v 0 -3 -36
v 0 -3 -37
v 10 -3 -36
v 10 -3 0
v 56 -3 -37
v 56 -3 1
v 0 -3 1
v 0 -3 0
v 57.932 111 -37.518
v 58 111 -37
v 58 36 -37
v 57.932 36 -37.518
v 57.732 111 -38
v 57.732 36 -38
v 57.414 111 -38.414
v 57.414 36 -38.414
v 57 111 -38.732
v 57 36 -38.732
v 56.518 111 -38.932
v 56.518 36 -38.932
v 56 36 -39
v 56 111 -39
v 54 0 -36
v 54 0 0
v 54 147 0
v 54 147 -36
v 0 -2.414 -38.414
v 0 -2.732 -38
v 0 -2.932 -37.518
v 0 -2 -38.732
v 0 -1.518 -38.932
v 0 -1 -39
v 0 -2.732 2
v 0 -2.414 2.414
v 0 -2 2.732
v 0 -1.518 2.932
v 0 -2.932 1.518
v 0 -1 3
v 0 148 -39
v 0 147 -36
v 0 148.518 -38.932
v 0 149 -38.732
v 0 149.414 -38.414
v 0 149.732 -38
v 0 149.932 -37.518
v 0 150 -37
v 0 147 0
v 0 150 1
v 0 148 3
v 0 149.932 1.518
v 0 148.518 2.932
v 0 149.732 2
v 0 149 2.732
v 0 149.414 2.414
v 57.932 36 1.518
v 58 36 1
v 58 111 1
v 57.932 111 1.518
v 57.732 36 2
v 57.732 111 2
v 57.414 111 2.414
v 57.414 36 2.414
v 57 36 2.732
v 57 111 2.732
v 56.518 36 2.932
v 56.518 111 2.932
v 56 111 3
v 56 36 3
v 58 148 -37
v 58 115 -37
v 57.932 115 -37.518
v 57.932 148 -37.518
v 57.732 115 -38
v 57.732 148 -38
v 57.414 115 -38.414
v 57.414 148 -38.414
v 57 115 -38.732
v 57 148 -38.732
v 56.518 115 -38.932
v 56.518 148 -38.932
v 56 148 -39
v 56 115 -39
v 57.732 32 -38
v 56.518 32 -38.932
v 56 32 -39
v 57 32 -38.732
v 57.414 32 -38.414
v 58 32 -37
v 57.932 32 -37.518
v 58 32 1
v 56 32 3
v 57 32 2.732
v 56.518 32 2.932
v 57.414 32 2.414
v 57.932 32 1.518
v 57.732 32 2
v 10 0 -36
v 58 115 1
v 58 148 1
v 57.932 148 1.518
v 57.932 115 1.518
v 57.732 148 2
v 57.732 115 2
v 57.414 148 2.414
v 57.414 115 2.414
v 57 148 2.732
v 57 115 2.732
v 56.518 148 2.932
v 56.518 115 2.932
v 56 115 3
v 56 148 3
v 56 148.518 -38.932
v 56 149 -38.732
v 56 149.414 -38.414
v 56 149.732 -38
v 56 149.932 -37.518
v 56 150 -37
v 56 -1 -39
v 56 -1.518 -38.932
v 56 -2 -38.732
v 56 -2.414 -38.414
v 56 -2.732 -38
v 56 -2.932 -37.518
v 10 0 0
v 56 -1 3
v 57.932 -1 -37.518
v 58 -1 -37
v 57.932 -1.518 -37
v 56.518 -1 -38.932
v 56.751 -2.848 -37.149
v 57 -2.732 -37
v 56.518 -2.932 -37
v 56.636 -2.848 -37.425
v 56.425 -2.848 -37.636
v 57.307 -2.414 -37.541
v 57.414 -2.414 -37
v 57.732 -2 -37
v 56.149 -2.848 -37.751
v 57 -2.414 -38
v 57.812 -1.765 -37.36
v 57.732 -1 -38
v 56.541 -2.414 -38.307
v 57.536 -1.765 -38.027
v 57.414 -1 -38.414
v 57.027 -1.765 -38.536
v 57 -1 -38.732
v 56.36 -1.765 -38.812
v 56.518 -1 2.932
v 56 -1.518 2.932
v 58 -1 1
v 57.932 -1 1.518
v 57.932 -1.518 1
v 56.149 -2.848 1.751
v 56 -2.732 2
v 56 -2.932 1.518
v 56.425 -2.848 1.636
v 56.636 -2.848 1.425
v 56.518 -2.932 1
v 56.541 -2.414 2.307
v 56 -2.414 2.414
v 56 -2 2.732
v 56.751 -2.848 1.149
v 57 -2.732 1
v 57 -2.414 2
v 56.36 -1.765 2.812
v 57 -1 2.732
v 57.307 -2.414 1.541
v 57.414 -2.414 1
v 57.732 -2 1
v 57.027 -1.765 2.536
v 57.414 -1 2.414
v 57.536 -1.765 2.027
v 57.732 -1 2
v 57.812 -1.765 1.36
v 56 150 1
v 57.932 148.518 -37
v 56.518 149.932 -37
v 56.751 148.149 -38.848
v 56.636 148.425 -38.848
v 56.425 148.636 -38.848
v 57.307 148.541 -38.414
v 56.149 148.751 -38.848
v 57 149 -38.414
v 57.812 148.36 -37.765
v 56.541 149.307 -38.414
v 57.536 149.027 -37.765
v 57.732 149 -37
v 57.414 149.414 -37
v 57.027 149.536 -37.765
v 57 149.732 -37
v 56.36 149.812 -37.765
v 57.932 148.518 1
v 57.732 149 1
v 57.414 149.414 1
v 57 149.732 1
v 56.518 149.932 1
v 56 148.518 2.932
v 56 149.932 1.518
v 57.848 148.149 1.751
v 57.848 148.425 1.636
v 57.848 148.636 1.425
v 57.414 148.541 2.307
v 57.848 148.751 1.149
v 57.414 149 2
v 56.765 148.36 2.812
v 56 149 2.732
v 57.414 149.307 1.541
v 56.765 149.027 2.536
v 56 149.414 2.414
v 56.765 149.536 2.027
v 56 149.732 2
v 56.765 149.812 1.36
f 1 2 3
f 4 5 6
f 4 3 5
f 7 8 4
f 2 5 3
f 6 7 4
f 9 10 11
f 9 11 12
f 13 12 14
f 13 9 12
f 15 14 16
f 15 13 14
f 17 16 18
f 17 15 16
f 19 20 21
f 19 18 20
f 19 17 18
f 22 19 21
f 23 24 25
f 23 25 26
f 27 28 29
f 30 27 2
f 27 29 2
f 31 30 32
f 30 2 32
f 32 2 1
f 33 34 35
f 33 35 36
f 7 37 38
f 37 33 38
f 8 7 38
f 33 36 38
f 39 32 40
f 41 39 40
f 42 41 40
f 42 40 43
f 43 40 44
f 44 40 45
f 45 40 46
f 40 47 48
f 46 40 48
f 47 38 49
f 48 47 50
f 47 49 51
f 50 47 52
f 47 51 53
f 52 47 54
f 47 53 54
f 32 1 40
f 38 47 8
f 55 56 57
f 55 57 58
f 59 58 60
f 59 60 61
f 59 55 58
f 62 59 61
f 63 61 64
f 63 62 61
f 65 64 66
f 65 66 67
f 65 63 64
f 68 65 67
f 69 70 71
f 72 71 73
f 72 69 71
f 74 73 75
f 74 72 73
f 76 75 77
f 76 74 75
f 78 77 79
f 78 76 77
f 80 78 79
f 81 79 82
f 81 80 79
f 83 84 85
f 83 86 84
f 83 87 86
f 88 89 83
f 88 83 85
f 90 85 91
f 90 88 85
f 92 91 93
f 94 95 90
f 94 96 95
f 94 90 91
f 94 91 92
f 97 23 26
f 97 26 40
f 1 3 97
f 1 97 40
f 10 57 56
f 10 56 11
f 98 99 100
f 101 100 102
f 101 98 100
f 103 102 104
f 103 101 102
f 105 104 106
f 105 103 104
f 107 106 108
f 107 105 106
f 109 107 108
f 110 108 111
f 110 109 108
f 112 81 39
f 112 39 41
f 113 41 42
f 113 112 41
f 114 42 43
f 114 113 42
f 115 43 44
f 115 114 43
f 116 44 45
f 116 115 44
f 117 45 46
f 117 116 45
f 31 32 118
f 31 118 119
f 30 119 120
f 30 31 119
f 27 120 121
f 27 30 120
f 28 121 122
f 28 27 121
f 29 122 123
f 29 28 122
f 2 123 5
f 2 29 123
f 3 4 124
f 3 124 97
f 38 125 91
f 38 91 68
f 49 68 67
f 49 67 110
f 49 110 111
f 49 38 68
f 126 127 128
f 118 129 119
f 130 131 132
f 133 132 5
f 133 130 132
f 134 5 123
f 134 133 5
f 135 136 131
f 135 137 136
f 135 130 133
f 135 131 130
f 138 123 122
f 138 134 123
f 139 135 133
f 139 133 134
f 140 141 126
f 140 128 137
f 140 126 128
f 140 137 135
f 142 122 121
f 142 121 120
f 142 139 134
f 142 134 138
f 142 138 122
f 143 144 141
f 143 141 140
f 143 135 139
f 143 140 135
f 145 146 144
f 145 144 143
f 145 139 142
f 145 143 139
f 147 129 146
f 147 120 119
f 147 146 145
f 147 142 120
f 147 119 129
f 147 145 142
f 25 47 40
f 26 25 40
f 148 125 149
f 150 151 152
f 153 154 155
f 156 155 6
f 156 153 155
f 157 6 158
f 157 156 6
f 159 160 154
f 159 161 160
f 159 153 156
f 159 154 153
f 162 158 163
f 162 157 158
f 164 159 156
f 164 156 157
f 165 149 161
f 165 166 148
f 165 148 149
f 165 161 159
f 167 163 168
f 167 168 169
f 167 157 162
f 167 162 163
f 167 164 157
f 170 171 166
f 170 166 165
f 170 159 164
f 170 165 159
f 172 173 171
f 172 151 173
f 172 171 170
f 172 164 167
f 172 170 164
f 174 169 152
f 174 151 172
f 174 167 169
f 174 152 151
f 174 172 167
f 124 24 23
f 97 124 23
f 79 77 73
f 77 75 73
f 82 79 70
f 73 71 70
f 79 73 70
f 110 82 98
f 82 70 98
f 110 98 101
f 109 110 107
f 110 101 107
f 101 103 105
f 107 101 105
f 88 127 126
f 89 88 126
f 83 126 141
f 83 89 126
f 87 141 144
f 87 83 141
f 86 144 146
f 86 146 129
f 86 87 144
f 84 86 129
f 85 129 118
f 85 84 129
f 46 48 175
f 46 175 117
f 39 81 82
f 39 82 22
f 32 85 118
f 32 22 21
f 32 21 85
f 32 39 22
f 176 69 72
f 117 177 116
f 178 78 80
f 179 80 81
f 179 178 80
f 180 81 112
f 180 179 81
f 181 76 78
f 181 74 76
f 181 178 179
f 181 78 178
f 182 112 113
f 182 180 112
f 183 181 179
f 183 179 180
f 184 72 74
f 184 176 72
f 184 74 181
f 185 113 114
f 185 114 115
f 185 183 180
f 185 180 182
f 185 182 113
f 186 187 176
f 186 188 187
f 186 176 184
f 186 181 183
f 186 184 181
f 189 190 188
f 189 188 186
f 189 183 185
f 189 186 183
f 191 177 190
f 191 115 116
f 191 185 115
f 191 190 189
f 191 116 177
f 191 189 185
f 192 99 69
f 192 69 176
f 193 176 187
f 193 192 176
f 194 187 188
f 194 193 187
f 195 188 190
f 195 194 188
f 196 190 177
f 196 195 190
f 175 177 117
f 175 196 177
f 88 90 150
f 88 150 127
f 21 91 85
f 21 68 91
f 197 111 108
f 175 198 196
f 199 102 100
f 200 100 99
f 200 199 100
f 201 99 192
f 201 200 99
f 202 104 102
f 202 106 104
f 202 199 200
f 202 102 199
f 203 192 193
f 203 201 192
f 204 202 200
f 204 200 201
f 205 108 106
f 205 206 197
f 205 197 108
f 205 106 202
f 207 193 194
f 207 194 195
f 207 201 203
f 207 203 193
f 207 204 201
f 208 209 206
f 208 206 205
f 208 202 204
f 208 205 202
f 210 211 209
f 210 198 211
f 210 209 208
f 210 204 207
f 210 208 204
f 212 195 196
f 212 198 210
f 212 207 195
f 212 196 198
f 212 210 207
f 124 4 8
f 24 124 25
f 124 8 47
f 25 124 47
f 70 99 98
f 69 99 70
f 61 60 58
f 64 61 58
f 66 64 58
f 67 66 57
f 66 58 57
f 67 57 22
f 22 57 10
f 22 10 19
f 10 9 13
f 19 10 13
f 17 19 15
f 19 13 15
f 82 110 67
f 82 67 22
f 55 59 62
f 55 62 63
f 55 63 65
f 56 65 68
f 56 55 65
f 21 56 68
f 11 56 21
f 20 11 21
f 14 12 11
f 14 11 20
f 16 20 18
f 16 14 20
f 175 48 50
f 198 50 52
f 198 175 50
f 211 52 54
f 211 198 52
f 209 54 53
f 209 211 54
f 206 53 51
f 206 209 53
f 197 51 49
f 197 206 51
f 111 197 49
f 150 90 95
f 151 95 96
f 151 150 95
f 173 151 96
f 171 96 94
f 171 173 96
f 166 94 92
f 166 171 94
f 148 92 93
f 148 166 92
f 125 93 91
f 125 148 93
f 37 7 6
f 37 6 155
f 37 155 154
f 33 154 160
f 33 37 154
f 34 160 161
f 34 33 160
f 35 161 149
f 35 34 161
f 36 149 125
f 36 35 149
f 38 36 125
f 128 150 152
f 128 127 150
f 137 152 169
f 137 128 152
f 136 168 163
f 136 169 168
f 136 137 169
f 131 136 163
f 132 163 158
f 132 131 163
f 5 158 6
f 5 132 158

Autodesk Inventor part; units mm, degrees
ref_plane "YZ Plane" through (0, 0, 0) normal (1, 0, 0) x (0, 1, 0)
ref_plane "XZ Plane" through (0, 0, 0) normal (0, 1, 0) x (-1, 0, 0)
ref_plane "XY Plane" through (0, 0, 0) normal (0, 0, 1) x (1, 0, 0)
sketch "Sketch1" plane through (0, 0, 0) normal (1, 0, 0) x (0, 1, 0)
  line L0 (0, 0) -> (0, -36)
  line L1 (0, 0) -> (36, 0) construction
  line L2 (0, 0) -> (147, 0)
  line L3 (147, 0) -> (147, -36)
  line L4 (147, -36) -> (0, -36)
  line L5 (147, -36) -> (147, -39)
  line L6 (147, -39) -> (-3, -39)
  line L7 (-3, -39) -> (-3, 3)
  line L8 (-3, 3) -> (150, 3)
  line L9 (150, 3) -> (150, -39)
  line L10 (150, -39) -> (147, -39)
  dimension "d0" = 36
  dimension "d1" = 90
  dimension "d2" = 147
  dimension "d3" = 3
  dimension "d4" = 150
  dimension "d5" = 42
  dimension "d6" = 153
extrude "Extrusion1" add sketch "Sketch1" along normal blind 54
sketch "Sketch2" plane through (54, 0, 0) normal (1, 0, 0) x (0, 0, -1)
  line L0 (39, 150) -> (-3, 150) projected
  line L1 (-3, 150) -> (-3, -3) projected
  line L2 (-3, -3) -> (39, -3) projected
  line L3 (39, -3) -> (39, 150) projected
  line L4 (36, 147) -> (36, 0) projected
  line L5 (36, 0) -> (0, 0) projected
  line L6 (0, 0) -> (0, 147) projected
  line L7 (0, 147) -> (36, 147) projected
extrude "Extrusion2" add sketch "Sketch2" along normal blind 4 contours L3 L2 L1 L0 | L4 L5 L6 L7
sketch "Sketch3" plane through (0, -3, -39) normal (0, -1, 0) x (1, 0, 0)
  line L0 (0, 42) -> (0, 0) projected
  line L1 (0, 0) -> (58, 0) projected
  line L2 (58, 42) -> (58, 0) projected
  line L3 (0, 42) -> (58, 42) projected
  line L4 (0, 0) -> (0, 42) projected
  line L5 (0, 42) -> (0, 39)
  line L6 (0, 3) -> (0, 39) projected
  line L7 (0, 39) -> (10, 39)
  line L8 (0, 39) -> (54, 39) projected
  line L9 (0, 39) -> (10, 39) construction
  line L10 (10, 39) -> (10, 3)
  line L11 (10, 3) -> (0, 3)
  line L12 (0, 3) -> (0, 0)
  dimension "d11" = 10
  dimension "d12" = 0
  dimension "d13" = 36
extrude "Extrusion3" cut sketch "Sketch3" against normal blind 4 contours L7 L10 L11 L0
sketch "Sketch4" plane through (58, 0, 0) normal (1, 0, 0) x (0, 0, -1)
  line L0 (-3, 150) -> (-3, -3) projected
  line L1 (-3, -3) -> (39, -3) projected
  line L2 (39, -3) -> (39, 150) projected
  line L3 (39, 150) -> (-3, 150) projected
  line L4 (-3, 150) -> (-3, -3) projected
  line L5 (-3, -3) -> (-3, 32)
  line L6 (-3, 150) -> (-3, 115)
  line L7 (-3, 115) -> (-3, 111)
  line L8 (-3, 111) -> (39, 111)
  line L9 (39, -3) -> (39, 150) projected
  line L10 (39, 111) -> (39, 115)
  line L11 (39, 115) -> (-3, 115)
  line L12 (-3, 32) -> (-3, 36)
  line L13 (-3, 36) -> (39, 36)
  line L14 (39, 36) -> (39, 32)
  line L15 (39, 32) -> (-3, 32)
  point P0 (0, 0)
  dimension "d16" = 35
  dimension "d17" = 35
  dimension "d18" = 4
  dimension "d19" = 4
  dimension "d20" = 4
extrude "Extrusion4" cut sketch "Sketch4" against normal blind 2 contours L11 L2 L8 L0 | L13 L2 L15 L0
fillet "Fillet1" radius 2 12 edges at (29, 150, 3) (58, 132.5, 3) (58, 73.5, 3) (58, 150, -18) (58, 132.5, -39) (58, 73.5, -39) (58, 14.5, -39) (58, 14.5, 3) (29, -3, 3) (58, -3, -18) (29, -3, -39) (29, 150, -39)
properties part number "carcasa_lippo"
